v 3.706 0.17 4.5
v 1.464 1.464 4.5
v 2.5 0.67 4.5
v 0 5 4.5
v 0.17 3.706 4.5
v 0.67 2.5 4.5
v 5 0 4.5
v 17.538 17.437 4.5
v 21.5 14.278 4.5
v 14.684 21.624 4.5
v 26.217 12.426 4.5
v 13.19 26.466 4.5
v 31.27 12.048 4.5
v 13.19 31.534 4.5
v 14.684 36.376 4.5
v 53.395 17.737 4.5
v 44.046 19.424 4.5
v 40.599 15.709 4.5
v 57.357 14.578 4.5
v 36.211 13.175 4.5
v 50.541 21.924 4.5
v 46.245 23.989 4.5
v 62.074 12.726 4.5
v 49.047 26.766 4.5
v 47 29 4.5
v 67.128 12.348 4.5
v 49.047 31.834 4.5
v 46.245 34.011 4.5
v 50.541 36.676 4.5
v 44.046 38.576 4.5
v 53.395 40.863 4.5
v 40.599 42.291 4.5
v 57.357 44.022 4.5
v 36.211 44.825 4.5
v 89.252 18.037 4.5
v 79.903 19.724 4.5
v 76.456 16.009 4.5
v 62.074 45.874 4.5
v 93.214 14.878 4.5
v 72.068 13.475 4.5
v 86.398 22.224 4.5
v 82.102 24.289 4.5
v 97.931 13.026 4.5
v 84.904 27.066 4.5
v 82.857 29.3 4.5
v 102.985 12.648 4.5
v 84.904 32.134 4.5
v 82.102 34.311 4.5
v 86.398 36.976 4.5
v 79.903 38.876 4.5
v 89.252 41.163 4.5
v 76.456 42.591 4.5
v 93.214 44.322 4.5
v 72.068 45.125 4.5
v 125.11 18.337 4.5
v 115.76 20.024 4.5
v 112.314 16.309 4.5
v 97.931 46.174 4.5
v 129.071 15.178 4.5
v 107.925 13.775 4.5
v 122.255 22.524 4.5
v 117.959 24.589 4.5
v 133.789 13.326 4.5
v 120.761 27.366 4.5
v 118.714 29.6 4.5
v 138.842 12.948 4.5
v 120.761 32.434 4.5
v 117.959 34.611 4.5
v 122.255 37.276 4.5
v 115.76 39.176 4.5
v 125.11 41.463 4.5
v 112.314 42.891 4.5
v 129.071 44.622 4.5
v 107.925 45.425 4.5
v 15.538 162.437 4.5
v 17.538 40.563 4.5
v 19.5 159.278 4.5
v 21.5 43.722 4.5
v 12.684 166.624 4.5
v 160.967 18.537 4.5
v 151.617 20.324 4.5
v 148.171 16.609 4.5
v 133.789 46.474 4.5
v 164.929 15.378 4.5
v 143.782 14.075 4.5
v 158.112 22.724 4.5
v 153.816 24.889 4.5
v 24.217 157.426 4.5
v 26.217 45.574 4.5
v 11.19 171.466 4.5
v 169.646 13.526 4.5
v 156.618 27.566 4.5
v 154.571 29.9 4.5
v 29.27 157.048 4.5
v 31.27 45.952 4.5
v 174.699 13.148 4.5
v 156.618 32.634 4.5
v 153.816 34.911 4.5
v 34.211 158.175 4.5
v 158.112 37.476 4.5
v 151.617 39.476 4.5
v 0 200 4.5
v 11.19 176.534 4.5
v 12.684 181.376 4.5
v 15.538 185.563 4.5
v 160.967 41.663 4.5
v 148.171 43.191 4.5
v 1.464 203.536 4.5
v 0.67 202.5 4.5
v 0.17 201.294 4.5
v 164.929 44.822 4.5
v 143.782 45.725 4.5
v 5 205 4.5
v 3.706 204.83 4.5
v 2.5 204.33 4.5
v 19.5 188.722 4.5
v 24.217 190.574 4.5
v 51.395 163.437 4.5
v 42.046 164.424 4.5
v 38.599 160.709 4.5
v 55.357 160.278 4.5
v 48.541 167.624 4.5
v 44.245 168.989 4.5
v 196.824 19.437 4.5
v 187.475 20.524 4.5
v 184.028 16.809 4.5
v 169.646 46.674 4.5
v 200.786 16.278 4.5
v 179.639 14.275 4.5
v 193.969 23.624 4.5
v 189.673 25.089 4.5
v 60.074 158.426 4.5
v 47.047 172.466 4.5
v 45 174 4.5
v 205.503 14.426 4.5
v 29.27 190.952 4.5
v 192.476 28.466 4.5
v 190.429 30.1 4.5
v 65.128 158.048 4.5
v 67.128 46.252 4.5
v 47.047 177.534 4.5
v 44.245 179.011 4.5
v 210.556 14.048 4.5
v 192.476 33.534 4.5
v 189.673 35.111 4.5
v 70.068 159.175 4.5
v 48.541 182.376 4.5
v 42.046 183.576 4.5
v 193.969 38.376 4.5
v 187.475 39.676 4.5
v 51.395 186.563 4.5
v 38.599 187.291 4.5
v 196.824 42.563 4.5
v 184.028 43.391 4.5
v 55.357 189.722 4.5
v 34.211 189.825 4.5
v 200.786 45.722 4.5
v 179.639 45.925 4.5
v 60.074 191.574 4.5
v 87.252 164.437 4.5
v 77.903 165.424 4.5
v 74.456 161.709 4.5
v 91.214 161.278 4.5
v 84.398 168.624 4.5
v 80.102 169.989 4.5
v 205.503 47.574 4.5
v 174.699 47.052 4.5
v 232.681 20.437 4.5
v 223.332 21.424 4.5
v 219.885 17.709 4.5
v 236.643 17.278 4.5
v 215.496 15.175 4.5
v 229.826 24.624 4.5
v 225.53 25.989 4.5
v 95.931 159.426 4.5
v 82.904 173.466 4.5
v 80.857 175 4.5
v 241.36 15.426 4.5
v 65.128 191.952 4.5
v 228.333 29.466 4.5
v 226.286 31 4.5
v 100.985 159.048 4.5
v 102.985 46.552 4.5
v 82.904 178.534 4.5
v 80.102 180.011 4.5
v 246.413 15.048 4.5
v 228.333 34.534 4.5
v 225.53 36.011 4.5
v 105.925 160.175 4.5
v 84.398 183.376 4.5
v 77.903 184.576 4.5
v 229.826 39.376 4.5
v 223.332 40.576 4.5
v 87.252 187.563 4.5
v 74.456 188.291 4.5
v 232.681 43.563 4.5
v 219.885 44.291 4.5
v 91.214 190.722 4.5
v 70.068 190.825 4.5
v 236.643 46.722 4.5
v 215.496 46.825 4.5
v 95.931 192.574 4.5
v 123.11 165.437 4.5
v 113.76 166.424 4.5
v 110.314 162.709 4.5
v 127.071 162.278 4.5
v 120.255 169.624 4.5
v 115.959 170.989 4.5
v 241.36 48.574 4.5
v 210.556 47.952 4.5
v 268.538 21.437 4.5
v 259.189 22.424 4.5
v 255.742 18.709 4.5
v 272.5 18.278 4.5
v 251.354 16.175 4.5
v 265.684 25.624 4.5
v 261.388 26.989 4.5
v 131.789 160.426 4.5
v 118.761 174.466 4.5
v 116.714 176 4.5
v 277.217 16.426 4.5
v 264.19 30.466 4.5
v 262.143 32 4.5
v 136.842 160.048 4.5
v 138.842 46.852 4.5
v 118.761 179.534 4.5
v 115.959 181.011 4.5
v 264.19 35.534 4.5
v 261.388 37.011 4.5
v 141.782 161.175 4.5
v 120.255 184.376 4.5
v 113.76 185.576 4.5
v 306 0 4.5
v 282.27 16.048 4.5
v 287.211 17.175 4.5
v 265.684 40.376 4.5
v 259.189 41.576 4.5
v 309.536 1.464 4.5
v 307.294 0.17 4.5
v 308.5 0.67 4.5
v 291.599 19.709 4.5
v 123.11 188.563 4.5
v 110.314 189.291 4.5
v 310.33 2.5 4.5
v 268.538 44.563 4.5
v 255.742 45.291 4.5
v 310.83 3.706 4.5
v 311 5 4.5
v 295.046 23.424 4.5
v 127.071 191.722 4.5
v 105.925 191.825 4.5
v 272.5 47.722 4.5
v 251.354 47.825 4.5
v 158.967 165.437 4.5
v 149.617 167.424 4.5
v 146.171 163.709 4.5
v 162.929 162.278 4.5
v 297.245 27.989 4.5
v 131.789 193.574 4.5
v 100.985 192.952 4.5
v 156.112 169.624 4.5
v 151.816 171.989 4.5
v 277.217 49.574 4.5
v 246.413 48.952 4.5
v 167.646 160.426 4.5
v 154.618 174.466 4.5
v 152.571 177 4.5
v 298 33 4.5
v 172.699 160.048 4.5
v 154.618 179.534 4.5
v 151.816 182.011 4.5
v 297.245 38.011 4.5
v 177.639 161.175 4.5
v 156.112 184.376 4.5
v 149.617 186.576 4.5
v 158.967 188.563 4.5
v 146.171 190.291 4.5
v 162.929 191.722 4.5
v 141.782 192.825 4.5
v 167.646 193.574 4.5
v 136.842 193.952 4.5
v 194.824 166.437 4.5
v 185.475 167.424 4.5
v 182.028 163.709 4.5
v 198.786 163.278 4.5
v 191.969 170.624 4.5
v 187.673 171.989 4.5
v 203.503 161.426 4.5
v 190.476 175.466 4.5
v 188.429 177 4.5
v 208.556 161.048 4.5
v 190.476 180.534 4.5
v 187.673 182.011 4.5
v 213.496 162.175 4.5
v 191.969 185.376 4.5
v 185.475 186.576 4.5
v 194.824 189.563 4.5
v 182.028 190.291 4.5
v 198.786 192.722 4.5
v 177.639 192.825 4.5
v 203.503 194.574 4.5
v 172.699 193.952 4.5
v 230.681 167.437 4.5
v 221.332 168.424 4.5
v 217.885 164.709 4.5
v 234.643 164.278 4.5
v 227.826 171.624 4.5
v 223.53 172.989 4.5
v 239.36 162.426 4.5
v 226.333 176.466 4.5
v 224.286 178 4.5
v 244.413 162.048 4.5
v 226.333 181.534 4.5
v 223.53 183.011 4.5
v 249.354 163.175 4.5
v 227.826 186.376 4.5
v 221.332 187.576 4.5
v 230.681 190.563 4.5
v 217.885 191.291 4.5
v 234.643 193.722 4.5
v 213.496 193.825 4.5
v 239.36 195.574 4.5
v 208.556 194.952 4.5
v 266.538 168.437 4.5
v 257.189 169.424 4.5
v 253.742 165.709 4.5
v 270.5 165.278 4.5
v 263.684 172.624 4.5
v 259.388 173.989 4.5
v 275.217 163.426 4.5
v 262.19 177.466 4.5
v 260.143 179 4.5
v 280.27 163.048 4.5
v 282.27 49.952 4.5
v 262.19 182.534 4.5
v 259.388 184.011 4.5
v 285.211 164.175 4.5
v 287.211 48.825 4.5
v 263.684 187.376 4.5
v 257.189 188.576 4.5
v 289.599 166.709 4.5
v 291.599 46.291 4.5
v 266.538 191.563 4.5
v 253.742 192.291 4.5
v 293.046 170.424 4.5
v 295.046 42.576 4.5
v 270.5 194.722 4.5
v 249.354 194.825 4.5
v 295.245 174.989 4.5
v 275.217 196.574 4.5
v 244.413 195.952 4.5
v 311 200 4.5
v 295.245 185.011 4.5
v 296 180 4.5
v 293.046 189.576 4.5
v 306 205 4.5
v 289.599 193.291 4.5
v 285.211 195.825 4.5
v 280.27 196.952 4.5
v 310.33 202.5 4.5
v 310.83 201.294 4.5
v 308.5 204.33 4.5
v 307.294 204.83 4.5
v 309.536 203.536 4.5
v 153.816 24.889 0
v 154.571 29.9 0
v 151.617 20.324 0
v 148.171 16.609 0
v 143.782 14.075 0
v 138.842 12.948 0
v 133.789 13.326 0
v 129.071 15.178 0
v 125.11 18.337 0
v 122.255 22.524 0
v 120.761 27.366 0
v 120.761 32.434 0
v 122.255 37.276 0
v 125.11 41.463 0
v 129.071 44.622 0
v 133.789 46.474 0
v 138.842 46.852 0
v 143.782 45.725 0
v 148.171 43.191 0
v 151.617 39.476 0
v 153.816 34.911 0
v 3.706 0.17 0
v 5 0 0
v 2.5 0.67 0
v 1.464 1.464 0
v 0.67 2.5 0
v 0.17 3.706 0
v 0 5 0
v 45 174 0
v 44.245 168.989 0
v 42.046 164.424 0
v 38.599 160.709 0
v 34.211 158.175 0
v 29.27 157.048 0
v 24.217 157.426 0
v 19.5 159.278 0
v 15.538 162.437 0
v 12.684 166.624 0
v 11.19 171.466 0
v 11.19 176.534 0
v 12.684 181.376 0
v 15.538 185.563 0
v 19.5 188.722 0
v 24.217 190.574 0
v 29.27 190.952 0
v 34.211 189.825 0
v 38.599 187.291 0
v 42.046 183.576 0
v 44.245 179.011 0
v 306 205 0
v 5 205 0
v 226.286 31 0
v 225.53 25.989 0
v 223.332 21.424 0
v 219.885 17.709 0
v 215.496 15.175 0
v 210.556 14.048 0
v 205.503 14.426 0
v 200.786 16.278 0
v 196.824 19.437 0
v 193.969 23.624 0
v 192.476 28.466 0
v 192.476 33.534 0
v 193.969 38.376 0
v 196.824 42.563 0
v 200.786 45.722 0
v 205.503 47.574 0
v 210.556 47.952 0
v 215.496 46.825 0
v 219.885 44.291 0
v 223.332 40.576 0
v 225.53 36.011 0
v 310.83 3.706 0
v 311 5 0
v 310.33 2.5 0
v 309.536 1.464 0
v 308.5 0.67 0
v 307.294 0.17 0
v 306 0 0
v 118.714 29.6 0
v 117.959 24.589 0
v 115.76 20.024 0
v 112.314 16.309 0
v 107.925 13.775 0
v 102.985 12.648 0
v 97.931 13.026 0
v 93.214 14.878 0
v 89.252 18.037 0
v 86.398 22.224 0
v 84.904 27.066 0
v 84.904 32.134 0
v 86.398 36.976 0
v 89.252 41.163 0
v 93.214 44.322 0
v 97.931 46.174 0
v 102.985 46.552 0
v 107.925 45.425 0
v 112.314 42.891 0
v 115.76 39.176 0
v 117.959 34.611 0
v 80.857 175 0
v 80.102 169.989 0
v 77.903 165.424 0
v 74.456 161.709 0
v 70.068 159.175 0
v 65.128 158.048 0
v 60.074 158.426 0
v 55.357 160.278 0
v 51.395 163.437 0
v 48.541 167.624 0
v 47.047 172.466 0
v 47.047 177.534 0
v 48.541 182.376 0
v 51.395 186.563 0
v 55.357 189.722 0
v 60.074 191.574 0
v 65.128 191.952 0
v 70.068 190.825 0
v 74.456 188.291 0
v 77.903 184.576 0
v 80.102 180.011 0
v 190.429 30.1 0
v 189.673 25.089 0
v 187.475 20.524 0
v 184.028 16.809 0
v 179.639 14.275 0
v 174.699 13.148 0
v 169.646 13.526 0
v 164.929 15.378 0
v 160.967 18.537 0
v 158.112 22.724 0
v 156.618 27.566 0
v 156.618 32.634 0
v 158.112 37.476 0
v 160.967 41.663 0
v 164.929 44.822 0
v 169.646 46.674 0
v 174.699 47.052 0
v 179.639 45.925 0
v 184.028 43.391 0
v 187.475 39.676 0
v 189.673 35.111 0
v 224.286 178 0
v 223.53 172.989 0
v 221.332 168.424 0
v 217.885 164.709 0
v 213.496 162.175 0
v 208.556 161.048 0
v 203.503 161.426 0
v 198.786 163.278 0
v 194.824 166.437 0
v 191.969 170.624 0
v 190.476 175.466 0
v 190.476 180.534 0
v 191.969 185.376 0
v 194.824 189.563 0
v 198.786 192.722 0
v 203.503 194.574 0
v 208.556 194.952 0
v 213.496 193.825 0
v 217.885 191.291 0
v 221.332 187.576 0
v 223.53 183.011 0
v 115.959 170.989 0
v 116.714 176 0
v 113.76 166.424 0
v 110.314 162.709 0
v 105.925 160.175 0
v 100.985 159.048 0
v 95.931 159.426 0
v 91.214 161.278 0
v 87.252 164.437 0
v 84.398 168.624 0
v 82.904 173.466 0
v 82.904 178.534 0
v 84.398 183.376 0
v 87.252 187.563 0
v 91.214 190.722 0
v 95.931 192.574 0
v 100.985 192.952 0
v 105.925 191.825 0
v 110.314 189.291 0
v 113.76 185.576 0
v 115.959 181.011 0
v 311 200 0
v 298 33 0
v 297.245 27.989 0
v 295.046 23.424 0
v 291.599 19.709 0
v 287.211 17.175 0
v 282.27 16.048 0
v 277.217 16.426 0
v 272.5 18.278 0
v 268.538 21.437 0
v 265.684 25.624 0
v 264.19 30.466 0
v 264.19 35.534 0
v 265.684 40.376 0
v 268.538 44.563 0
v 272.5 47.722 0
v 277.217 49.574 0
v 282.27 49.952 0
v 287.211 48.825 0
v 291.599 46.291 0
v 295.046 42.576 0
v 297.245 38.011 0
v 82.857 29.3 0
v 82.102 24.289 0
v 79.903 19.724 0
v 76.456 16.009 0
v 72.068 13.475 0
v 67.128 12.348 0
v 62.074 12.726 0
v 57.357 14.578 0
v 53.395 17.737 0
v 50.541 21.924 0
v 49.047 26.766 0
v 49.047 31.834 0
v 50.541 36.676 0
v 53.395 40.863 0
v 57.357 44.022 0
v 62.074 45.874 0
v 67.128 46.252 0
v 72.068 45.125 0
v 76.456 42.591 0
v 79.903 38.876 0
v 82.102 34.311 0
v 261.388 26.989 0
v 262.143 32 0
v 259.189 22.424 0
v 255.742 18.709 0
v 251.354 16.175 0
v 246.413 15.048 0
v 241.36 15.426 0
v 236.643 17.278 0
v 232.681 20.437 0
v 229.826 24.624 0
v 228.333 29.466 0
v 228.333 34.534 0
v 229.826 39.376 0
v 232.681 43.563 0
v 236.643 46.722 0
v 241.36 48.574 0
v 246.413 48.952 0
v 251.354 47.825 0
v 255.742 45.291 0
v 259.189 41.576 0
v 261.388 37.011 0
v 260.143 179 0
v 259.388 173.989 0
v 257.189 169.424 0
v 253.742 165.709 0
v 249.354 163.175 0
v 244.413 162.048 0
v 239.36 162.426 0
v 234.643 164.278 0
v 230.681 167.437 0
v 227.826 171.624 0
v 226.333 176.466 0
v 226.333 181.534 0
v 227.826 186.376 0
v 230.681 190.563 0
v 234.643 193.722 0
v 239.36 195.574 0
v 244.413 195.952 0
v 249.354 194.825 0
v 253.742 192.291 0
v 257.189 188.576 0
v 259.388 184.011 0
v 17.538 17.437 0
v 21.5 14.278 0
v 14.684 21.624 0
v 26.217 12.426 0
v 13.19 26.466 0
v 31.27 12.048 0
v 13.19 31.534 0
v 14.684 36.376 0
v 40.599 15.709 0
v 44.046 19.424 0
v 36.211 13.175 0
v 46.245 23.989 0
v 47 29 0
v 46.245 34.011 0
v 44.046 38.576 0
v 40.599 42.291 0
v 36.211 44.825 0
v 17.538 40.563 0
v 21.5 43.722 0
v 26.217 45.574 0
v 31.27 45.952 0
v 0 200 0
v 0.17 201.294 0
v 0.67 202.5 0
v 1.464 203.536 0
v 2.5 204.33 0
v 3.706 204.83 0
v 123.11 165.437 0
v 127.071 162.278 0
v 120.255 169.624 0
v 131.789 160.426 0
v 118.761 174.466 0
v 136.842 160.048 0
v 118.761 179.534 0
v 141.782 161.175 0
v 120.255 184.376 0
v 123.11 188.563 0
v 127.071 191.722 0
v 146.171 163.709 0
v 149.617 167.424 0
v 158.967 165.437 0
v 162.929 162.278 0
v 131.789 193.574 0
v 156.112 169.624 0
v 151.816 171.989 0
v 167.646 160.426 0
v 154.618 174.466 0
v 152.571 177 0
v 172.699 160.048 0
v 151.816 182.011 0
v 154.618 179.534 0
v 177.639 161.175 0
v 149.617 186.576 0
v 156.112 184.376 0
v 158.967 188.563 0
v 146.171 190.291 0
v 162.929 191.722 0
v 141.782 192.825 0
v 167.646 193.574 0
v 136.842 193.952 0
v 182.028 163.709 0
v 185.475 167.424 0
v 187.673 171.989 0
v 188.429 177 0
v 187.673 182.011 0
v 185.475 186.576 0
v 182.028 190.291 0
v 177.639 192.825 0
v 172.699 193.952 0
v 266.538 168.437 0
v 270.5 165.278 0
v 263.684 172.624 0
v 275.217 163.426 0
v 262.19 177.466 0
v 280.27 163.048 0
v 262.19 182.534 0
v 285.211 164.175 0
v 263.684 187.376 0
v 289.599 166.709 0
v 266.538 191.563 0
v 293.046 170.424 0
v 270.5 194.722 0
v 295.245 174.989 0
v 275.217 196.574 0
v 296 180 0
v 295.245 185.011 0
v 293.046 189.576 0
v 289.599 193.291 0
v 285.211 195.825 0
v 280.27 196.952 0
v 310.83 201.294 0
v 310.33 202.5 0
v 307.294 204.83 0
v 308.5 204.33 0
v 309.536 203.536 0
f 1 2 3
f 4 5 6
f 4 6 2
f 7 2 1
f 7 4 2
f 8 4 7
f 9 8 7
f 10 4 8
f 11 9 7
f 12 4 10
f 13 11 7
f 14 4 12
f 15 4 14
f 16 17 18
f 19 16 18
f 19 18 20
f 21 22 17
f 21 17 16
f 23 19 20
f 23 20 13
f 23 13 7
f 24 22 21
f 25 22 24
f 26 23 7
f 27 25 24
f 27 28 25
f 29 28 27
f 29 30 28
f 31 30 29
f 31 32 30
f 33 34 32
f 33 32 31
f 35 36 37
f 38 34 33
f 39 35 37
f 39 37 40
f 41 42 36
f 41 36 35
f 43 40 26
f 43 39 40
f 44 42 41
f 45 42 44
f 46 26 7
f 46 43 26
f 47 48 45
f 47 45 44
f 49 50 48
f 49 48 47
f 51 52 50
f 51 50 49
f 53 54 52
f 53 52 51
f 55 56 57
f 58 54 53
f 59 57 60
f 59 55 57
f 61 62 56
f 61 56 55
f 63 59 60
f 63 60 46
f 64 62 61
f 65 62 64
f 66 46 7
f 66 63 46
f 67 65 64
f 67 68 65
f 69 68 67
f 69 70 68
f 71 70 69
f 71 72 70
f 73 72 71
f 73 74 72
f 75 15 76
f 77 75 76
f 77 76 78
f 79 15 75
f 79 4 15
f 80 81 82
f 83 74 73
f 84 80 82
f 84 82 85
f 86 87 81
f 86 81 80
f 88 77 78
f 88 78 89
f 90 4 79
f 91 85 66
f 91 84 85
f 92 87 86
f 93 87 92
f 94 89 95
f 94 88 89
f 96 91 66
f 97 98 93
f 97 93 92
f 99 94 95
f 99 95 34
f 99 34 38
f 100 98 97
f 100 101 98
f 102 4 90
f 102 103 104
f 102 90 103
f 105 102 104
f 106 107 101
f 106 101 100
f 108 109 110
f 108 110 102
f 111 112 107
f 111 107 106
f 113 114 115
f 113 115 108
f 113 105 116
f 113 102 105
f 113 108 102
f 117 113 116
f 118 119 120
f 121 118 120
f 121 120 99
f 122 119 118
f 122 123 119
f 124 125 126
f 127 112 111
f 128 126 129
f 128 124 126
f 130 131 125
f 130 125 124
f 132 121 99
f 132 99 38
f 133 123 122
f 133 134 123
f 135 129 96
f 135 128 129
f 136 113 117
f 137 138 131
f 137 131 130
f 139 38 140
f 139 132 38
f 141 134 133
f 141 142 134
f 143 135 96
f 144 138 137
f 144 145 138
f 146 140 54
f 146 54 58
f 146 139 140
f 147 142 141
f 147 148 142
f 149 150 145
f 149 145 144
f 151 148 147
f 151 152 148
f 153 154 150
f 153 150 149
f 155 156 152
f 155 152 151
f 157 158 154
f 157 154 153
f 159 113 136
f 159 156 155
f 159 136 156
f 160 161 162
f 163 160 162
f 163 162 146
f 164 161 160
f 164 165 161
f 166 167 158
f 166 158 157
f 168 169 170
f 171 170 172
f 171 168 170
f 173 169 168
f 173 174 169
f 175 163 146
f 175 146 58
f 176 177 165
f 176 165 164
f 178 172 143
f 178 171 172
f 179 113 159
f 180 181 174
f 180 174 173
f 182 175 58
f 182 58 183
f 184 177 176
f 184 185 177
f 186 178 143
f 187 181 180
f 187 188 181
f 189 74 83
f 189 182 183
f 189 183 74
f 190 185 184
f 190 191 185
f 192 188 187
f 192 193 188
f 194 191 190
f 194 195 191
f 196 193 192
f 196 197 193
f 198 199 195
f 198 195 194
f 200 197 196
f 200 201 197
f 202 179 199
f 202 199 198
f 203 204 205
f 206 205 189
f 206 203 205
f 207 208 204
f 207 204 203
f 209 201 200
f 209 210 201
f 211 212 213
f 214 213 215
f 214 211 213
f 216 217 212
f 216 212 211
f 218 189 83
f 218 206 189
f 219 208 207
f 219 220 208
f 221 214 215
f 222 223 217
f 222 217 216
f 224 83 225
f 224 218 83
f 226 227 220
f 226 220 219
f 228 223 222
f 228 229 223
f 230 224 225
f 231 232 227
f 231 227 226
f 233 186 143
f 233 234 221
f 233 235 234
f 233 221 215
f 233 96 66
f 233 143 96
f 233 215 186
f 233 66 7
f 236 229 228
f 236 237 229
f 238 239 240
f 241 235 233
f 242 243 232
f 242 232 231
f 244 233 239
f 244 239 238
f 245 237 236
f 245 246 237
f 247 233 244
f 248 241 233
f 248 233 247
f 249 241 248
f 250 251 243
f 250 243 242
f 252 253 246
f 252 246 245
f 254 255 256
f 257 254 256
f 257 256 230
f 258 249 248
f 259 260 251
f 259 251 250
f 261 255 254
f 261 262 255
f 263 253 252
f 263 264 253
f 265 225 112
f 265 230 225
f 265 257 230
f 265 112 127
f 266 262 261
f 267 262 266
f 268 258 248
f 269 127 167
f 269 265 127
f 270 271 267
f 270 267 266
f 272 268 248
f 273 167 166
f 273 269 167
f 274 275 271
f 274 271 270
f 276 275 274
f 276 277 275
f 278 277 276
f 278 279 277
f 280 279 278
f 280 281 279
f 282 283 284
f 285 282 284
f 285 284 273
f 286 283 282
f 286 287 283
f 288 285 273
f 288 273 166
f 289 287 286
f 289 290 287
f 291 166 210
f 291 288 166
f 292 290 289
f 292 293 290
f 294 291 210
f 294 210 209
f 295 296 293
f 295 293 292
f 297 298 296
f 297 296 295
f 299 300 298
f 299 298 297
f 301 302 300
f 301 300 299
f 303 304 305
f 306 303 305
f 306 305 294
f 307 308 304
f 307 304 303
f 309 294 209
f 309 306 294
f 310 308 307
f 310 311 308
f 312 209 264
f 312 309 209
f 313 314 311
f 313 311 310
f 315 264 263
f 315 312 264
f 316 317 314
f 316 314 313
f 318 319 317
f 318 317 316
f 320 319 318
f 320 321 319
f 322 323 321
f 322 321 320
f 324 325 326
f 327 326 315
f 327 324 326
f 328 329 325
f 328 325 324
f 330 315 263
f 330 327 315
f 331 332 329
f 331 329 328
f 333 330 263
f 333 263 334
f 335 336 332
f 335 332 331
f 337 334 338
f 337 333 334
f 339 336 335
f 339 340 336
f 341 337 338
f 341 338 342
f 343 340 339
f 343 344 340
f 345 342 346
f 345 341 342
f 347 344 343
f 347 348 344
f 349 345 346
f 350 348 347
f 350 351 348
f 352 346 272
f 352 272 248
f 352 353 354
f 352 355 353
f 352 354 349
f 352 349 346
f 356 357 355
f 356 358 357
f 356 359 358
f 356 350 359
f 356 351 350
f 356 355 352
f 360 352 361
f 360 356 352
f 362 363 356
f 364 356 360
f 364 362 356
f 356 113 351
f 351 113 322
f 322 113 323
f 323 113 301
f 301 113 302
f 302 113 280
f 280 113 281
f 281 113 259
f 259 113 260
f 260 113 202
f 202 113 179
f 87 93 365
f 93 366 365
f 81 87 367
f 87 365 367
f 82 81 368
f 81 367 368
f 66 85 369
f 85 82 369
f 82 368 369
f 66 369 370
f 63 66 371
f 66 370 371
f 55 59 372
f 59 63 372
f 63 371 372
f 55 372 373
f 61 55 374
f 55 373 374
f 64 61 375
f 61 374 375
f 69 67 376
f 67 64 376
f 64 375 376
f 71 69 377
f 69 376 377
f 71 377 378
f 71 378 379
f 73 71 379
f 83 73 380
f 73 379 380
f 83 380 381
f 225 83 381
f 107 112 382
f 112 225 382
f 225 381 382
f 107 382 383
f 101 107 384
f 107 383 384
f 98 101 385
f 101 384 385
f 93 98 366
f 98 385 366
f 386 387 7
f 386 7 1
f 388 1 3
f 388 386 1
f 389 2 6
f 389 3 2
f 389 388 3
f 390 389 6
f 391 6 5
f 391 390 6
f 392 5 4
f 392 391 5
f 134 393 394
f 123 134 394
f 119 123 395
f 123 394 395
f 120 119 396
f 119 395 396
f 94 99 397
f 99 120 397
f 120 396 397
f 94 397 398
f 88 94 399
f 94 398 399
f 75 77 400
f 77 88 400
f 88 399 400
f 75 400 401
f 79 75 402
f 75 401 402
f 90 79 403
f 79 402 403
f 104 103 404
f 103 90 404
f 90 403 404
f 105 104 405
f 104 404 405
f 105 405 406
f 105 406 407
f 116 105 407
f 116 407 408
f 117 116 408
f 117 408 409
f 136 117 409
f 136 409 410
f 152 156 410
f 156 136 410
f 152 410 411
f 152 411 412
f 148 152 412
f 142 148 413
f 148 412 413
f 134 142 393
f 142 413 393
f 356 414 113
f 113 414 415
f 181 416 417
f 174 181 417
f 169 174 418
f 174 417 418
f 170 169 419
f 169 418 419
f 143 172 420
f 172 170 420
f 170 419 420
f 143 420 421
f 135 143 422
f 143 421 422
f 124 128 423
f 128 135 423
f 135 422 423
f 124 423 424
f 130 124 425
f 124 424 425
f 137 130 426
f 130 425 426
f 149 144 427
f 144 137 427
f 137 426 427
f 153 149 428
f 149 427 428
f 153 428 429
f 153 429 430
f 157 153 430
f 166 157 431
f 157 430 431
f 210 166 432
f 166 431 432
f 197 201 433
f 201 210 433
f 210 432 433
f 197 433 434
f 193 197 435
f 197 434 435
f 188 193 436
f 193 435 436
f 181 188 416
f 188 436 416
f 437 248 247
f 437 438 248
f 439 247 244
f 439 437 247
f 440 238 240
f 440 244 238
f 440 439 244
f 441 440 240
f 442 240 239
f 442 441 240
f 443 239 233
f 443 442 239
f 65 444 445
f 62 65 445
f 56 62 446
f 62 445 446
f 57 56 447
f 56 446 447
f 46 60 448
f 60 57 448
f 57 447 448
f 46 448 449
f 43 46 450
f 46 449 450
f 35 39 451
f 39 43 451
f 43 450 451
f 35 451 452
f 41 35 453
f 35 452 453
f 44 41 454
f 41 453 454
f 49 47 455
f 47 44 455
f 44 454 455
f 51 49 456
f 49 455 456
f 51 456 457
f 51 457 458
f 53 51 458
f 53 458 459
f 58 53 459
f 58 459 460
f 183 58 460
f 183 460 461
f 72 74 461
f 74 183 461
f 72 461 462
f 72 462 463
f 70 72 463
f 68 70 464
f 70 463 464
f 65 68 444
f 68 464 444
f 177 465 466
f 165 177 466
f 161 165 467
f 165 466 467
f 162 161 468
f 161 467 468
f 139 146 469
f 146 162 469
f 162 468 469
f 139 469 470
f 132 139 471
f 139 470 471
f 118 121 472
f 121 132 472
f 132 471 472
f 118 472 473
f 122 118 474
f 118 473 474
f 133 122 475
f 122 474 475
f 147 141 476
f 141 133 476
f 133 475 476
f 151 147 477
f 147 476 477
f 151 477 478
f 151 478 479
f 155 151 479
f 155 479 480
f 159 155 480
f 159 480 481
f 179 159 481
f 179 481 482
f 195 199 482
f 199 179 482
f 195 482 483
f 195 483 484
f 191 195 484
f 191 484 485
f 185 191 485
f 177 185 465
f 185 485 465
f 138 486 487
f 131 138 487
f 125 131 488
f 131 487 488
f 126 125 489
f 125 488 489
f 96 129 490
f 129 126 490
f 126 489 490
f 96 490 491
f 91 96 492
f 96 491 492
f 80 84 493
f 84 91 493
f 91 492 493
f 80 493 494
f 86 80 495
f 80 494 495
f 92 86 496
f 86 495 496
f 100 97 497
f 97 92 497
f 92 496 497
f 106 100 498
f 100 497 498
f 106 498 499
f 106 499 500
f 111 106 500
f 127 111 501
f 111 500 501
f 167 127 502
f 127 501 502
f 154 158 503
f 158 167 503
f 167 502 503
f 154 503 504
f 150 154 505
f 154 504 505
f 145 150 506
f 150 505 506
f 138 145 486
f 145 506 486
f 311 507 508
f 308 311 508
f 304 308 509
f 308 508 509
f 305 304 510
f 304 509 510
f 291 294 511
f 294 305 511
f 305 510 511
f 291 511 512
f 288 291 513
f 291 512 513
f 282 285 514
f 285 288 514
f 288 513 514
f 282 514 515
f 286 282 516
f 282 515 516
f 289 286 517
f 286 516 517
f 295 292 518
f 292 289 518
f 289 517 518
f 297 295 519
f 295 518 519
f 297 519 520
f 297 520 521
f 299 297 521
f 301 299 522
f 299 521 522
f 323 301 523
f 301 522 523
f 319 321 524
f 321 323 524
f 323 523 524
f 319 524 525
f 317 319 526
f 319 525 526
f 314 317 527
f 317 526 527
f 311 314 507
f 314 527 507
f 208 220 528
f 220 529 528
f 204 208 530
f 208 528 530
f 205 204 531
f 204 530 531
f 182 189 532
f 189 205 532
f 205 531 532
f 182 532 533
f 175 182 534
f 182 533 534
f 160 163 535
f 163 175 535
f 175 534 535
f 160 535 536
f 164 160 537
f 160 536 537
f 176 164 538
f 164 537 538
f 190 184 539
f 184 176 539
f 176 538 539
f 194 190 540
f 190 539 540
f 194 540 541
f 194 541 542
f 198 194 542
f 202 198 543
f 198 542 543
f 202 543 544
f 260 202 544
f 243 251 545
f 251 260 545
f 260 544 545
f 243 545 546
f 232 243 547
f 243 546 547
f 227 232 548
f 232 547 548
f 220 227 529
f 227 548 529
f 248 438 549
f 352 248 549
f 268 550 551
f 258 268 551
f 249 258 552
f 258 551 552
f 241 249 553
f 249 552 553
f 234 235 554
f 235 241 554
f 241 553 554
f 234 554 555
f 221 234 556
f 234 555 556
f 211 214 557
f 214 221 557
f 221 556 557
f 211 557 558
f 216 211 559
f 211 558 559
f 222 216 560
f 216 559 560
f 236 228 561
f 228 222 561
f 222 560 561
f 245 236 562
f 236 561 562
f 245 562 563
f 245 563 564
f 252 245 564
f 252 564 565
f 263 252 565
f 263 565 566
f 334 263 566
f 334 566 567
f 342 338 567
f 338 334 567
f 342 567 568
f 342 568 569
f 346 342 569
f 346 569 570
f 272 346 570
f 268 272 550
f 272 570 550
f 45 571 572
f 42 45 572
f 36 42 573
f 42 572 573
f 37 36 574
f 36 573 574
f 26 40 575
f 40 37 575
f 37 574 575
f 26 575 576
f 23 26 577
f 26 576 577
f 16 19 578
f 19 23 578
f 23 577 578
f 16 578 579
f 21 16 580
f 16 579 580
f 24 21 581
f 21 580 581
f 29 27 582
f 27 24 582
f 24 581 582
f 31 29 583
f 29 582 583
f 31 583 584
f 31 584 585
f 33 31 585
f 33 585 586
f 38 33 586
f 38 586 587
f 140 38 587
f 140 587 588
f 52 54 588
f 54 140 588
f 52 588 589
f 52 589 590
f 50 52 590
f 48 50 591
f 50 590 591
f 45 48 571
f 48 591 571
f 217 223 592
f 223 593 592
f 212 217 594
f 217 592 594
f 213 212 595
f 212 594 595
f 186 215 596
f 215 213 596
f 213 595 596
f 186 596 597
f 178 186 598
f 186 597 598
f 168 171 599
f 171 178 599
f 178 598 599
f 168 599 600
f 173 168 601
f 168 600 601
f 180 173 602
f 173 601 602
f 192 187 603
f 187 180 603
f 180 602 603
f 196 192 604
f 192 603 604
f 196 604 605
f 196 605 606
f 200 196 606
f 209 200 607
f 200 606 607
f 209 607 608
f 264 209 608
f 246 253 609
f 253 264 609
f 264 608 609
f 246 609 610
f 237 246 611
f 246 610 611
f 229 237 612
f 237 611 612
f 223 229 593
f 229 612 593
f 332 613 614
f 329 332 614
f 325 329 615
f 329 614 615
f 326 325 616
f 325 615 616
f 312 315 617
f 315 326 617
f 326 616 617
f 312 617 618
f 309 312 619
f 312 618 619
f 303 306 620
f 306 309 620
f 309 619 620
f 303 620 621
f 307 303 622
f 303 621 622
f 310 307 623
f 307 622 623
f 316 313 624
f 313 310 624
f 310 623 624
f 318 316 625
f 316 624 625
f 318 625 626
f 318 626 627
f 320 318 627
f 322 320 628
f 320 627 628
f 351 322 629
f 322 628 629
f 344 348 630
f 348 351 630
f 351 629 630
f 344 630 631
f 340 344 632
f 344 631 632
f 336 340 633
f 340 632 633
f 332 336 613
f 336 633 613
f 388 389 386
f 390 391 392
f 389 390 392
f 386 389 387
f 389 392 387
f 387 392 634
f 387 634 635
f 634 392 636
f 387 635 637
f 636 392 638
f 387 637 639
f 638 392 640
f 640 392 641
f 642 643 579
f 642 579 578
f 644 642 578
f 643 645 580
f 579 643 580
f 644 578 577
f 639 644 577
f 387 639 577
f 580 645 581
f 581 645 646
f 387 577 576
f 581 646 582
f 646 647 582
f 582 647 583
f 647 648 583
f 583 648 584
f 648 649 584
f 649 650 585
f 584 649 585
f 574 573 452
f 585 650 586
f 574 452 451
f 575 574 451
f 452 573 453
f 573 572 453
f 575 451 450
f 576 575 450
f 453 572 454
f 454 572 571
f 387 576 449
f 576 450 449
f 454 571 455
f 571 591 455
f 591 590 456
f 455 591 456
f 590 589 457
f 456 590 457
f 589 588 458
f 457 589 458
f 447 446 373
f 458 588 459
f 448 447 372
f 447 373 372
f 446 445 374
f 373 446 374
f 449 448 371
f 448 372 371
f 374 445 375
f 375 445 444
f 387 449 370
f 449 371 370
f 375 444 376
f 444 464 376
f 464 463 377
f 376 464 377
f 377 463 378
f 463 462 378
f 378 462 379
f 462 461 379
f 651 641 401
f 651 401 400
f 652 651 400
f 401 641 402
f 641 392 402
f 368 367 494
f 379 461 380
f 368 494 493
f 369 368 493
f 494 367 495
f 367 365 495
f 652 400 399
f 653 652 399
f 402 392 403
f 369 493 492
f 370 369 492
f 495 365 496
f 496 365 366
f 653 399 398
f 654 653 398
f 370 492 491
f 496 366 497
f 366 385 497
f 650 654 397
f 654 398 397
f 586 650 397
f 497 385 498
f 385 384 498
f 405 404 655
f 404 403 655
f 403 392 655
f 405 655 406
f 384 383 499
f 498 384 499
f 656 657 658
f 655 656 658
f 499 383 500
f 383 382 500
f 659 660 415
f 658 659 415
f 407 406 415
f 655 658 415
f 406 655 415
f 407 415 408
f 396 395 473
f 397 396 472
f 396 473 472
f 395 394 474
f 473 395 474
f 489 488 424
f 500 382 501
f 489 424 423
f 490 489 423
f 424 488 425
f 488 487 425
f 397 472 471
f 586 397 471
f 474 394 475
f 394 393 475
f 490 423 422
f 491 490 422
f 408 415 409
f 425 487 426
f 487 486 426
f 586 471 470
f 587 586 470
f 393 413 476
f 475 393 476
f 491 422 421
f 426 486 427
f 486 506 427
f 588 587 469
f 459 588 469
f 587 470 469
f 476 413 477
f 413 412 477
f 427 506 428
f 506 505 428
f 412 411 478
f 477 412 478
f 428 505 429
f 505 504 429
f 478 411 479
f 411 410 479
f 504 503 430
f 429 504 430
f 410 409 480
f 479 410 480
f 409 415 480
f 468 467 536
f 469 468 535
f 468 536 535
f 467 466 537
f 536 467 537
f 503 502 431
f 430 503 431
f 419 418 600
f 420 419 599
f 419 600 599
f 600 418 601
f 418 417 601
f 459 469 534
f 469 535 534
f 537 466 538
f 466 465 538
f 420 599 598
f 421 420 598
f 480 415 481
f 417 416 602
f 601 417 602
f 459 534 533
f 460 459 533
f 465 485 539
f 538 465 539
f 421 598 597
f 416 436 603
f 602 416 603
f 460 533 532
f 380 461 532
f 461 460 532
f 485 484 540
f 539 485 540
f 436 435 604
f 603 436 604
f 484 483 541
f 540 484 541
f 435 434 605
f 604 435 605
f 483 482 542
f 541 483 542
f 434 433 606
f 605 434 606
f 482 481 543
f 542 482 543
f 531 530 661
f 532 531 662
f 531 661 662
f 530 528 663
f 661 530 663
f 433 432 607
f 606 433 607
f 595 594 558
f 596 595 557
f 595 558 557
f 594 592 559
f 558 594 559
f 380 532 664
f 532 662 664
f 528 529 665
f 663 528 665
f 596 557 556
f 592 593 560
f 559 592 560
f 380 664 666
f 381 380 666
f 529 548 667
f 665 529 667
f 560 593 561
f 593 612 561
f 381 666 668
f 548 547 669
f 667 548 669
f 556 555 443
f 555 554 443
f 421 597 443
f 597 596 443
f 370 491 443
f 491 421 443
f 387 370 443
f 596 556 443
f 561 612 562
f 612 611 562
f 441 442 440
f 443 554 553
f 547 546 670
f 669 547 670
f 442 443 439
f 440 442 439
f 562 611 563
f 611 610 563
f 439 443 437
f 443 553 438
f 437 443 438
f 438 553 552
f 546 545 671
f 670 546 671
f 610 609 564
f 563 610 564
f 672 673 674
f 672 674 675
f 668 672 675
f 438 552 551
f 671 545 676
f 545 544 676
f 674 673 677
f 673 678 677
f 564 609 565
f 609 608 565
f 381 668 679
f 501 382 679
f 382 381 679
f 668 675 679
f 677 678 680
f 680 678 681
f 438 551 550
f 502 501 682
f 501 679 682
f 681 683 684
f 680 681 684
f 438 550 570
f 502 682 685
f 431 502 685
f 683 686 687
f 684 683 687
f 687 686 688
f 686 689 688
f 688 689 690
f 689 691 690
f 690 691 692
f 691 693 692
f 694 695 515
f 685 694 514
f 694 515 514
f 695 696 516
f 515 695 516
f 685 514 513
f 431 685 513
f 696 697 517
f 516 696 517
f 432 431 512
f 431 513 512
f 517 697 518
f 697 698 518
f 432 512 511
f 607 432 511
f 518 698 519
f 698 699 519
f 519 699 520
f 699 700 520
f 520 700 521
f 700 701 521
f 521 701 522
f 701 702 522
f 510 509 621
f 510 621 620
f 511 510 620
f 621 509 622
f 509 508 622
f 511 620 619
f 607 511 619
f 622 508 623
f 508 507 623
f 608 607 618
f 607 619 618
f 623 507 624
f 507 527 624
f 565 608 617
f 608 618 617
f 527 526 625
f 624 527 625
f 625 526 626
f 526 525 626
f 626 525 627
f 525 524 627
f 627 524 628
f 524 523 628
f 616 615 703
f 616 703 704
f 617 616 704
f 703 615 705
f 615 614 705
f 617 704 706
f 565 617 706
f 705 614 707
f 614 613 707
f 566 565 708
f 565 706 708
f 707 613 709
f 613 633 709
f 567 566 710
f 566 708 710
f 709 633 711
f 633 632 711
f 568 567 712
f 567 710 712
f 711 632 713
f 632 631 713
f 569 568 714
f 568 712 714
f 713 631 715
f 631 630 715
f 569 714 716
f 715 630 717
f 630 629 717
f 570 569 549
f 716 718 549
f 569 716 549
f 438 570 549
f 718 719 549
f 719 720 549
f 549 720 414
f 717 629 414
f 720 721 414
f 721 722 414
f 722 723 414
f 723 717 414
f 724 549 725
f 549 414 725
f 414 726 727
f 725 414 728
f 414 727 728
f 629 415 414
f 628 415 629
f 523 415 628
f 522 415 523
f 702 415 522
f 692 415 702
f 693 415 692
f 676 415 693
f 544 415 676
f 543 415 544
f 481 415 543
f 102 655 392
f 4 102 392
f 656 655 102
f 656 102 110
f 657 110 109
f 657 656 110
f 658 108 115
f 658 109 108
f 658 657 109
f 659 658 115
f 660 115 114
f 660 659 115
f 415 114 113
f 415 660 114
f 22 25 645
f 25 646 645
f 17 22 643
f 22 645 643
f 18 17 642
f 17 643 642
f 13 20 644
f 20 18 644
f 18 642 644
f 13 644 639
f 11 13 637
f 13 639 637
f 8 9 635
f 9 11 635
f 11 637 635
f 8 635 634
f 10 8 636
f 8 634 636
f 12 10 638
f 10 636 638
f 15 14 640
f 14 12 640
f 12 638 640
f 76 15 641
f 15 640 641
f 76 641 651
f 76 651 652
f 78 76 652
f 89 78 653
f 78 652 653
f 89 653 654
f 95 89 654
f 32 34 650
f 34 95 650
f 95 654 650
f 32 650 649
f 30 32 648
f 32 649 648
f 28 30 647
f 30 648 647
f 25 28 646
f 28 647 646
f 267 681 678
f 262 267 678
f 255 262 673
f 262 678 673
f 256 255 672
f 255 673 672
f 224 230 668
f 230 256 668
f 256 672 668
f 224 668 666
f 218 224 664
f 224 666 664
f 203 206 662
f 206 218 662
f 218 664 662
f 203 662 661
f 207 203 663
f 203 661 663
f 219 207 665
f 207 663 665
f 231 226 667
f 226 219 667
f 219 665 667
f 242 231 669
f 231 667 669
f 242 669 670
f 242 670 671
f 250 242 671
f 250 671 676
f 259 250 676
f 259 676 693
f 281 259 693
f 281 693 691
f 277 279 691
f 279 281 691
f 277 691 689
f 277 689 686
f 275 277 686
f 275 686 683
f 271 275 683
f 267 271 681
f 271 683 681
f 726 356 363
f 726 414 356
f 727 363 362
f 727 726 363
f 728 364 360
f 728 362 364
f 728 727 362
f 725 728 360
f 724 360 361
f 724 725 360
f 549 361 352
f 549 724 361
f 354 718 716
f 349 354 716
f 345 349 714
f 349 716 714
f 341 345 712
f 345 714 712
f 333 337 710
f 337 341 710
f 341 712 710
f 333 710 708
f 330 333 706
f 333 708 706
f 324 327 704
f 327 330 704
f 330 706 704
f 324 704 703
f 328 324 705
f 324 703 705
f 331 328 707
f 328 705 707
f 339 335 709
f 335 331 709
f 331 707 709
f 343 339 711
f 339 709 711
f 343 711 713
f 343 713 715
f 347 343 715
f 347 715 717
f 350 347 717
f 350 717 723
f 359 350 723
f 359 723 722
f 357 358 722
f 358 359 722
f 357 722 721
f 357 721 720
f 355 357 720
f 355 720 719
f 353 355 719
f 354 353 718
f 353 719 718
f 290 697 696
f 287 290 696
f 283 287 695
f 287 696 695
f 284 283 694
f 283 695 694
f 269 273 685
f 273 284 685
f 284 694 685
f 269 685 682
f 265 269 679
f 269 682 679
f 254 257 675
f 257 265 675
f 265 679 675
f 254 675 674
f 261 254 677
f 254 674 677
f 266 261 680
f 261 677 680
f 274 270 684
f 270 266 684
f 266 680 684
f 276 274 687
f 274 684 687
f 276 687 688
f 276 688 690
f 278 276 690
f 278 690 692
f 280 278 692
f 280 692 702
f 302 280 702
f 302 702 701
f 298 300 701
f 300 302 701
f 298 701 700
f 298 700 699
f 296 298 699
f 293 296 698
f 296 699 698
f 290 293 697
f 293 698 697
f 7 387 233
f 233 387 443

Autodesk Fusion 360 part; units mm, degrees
sketch "Sketch1" plane through (0, 0, 0) normal (0, 0, 1) x (1, 0, 0)
  line L0 (5, 0) -> (306, 0)
  line L1 (311, 5) -> (311, 200)
  line L2 (306, 205) -> (5, 205)
  line L3 (0, 200) -> (0, 5)
  circle A0 centre (30, 29) radius 17
  circle A1 centre (65.8571, 29.3) radius 17
  circle A2 centre (101.7143, 29.6) radius 17
  circle A3 centre (28, 174) radius 17
  circle A4 centre (99.7143, 176) radius 17
  circle A5 centre (63.8571, 175) radius 17
  circle A6 centre (137.5714, 29.9) radius 17
  circle A7 centre (135.5714, 177) radius 17
  circle A8 centre (173.4286, 30.1) radius 17
  circle A9 centre (209.2857, 31) radius 17
  circle A10 centre (245.1429, 32) radius 17
  circle A11 centre (281, 33) radius 17
  circle A12 centre (171.4286, 177) radius 17
  circle A13 centre (207.2857, 178) radius 17
  circle A14 centre (243.1429, 179) radius 17
  circle A15 centre (279, 180) radius 17
  arc A16 (311, 200) -> (306, 205) centre (306, 200) ccw
  arc A17 (5, 205) -> (0, 200) centre (5, 200) ccw
  arc A18 (306, 0) -> (311, 5) centre (306, 5) ccw
  arc A19 (0, 5) -> (5, 0) centre (5, 5) ccw
  dimension "d1" = 311
  dimension "d2" = 205
  dimension "d4" = 34
  dimension "d6" = 29
  dimension "d8" = 34
  dimension "d9" = 34
  dimension "d10" = 34
  dimension "d11" = 34
  dimension "d13" = 34
  dimension "d14" = 34
  dimension "d15" = 34
  dimension "d16" = 34
  dimension "d17" = 34
  dimension "d18" = 34
  dimension "d19" = 34
  dimension "d28" = 29.3
  dimension "d29" = 29.6
  dimension "d30" = 29.9
  dimension "d31" = 30.1
  dimension "d32" = 31
  dimension "d33" = 32
  dimension "d34" = 33
  dimension "d35" = 34
  dimension "d36" = 34
  dimension "d37" = 34
  dimension "d38" = 34
  dimension "d48" = 31
  dimension "d49" = 30
  dimension "d50" = 29
  dimension "d51" = 28
  dimension "d52" = 28
  dimension "d53" = 27
  dimension "d55" = 30
  dimension "d56" = 35.8571
  dimension "d57" = 35.8571
  dimension "d58" = 35.8571
  dimension "d59" = 35.8571
  dimension "d60" = 35.8571
  dimension "d61" = 35.8571
  dimension "d62" = 35.8571
  dimension "d63" = 30
  dimension "d64" = 28
  dimension "d66" = 35.8571
  dimension "d67" = 35.8571
  dimension "d68" = 35.8571
  dimension "d69" = 35.8571
  dimension "d70" = 35.8571
  dimension "d71" = 35.8571
  dimension "d72" = 32
  dimension "d73" = 26
  dimension "d74" = 25
  dimension "d75" = 35.8571
  dimension "d76" = 5
  dimension "d77" = 5
  dimension "d78" = 5
  dimension "d79" = 5
sketch "Sketch2" plane through (0, 0, 0) normal (0, 0, 1) x (1, 0, 0)
extrude "Extrude1" add sketch "Sketch1" along normal blind 3.5
extrude "Extrude2" add 1 faces at (123.0248, 122.1087, 3.5) along direction (0, 0, 1) blind 1
sketch "Sketch3" plane through (0, 0, 0) normal (0, 0, 1) x (1, 0, 0)
  line L0 (5, 0) -> (306.1184, 0)
  line L1 (311.1184, 5) -> (311.1184, 55.2879)
  line L2 (311.1184, 55.2879) -> (0, 55.2879)
  line L3 (0, 55.2879) -> (0, 5)
  line L4 (310, 148.1101) -> (0, 148.1101)
  line L5 (0, 148.1101) -> (0, 199.7882)
  line L6 (5, 204.7882) -> (305, 204.7882)
  line L7 (310, 199.7882) -> (310, 148.1101)
  arc A0 (5, 204.7882) -> (0, 199.7882) centre (5, 199.7882) ccw
  arc A1 (310, 199.7882) -> (305, 204.7882) centre (305, 199.7882) ccw
  arc A2 (0, 5) -> (5, 0) centre (5, 5) ccw
  arc A3 (306.1184, 0) -> (311.1184, 5) centre (306.1184, 5) ccw
  dimension "d84" = 5
  dimension "d85" = 5
  dimension "d86" = 5
  dimension "d87" = 5
sketch "Sketch4" plane through (0, 0, 0) normal (0, 0, 1) x (1, 0, 0)
